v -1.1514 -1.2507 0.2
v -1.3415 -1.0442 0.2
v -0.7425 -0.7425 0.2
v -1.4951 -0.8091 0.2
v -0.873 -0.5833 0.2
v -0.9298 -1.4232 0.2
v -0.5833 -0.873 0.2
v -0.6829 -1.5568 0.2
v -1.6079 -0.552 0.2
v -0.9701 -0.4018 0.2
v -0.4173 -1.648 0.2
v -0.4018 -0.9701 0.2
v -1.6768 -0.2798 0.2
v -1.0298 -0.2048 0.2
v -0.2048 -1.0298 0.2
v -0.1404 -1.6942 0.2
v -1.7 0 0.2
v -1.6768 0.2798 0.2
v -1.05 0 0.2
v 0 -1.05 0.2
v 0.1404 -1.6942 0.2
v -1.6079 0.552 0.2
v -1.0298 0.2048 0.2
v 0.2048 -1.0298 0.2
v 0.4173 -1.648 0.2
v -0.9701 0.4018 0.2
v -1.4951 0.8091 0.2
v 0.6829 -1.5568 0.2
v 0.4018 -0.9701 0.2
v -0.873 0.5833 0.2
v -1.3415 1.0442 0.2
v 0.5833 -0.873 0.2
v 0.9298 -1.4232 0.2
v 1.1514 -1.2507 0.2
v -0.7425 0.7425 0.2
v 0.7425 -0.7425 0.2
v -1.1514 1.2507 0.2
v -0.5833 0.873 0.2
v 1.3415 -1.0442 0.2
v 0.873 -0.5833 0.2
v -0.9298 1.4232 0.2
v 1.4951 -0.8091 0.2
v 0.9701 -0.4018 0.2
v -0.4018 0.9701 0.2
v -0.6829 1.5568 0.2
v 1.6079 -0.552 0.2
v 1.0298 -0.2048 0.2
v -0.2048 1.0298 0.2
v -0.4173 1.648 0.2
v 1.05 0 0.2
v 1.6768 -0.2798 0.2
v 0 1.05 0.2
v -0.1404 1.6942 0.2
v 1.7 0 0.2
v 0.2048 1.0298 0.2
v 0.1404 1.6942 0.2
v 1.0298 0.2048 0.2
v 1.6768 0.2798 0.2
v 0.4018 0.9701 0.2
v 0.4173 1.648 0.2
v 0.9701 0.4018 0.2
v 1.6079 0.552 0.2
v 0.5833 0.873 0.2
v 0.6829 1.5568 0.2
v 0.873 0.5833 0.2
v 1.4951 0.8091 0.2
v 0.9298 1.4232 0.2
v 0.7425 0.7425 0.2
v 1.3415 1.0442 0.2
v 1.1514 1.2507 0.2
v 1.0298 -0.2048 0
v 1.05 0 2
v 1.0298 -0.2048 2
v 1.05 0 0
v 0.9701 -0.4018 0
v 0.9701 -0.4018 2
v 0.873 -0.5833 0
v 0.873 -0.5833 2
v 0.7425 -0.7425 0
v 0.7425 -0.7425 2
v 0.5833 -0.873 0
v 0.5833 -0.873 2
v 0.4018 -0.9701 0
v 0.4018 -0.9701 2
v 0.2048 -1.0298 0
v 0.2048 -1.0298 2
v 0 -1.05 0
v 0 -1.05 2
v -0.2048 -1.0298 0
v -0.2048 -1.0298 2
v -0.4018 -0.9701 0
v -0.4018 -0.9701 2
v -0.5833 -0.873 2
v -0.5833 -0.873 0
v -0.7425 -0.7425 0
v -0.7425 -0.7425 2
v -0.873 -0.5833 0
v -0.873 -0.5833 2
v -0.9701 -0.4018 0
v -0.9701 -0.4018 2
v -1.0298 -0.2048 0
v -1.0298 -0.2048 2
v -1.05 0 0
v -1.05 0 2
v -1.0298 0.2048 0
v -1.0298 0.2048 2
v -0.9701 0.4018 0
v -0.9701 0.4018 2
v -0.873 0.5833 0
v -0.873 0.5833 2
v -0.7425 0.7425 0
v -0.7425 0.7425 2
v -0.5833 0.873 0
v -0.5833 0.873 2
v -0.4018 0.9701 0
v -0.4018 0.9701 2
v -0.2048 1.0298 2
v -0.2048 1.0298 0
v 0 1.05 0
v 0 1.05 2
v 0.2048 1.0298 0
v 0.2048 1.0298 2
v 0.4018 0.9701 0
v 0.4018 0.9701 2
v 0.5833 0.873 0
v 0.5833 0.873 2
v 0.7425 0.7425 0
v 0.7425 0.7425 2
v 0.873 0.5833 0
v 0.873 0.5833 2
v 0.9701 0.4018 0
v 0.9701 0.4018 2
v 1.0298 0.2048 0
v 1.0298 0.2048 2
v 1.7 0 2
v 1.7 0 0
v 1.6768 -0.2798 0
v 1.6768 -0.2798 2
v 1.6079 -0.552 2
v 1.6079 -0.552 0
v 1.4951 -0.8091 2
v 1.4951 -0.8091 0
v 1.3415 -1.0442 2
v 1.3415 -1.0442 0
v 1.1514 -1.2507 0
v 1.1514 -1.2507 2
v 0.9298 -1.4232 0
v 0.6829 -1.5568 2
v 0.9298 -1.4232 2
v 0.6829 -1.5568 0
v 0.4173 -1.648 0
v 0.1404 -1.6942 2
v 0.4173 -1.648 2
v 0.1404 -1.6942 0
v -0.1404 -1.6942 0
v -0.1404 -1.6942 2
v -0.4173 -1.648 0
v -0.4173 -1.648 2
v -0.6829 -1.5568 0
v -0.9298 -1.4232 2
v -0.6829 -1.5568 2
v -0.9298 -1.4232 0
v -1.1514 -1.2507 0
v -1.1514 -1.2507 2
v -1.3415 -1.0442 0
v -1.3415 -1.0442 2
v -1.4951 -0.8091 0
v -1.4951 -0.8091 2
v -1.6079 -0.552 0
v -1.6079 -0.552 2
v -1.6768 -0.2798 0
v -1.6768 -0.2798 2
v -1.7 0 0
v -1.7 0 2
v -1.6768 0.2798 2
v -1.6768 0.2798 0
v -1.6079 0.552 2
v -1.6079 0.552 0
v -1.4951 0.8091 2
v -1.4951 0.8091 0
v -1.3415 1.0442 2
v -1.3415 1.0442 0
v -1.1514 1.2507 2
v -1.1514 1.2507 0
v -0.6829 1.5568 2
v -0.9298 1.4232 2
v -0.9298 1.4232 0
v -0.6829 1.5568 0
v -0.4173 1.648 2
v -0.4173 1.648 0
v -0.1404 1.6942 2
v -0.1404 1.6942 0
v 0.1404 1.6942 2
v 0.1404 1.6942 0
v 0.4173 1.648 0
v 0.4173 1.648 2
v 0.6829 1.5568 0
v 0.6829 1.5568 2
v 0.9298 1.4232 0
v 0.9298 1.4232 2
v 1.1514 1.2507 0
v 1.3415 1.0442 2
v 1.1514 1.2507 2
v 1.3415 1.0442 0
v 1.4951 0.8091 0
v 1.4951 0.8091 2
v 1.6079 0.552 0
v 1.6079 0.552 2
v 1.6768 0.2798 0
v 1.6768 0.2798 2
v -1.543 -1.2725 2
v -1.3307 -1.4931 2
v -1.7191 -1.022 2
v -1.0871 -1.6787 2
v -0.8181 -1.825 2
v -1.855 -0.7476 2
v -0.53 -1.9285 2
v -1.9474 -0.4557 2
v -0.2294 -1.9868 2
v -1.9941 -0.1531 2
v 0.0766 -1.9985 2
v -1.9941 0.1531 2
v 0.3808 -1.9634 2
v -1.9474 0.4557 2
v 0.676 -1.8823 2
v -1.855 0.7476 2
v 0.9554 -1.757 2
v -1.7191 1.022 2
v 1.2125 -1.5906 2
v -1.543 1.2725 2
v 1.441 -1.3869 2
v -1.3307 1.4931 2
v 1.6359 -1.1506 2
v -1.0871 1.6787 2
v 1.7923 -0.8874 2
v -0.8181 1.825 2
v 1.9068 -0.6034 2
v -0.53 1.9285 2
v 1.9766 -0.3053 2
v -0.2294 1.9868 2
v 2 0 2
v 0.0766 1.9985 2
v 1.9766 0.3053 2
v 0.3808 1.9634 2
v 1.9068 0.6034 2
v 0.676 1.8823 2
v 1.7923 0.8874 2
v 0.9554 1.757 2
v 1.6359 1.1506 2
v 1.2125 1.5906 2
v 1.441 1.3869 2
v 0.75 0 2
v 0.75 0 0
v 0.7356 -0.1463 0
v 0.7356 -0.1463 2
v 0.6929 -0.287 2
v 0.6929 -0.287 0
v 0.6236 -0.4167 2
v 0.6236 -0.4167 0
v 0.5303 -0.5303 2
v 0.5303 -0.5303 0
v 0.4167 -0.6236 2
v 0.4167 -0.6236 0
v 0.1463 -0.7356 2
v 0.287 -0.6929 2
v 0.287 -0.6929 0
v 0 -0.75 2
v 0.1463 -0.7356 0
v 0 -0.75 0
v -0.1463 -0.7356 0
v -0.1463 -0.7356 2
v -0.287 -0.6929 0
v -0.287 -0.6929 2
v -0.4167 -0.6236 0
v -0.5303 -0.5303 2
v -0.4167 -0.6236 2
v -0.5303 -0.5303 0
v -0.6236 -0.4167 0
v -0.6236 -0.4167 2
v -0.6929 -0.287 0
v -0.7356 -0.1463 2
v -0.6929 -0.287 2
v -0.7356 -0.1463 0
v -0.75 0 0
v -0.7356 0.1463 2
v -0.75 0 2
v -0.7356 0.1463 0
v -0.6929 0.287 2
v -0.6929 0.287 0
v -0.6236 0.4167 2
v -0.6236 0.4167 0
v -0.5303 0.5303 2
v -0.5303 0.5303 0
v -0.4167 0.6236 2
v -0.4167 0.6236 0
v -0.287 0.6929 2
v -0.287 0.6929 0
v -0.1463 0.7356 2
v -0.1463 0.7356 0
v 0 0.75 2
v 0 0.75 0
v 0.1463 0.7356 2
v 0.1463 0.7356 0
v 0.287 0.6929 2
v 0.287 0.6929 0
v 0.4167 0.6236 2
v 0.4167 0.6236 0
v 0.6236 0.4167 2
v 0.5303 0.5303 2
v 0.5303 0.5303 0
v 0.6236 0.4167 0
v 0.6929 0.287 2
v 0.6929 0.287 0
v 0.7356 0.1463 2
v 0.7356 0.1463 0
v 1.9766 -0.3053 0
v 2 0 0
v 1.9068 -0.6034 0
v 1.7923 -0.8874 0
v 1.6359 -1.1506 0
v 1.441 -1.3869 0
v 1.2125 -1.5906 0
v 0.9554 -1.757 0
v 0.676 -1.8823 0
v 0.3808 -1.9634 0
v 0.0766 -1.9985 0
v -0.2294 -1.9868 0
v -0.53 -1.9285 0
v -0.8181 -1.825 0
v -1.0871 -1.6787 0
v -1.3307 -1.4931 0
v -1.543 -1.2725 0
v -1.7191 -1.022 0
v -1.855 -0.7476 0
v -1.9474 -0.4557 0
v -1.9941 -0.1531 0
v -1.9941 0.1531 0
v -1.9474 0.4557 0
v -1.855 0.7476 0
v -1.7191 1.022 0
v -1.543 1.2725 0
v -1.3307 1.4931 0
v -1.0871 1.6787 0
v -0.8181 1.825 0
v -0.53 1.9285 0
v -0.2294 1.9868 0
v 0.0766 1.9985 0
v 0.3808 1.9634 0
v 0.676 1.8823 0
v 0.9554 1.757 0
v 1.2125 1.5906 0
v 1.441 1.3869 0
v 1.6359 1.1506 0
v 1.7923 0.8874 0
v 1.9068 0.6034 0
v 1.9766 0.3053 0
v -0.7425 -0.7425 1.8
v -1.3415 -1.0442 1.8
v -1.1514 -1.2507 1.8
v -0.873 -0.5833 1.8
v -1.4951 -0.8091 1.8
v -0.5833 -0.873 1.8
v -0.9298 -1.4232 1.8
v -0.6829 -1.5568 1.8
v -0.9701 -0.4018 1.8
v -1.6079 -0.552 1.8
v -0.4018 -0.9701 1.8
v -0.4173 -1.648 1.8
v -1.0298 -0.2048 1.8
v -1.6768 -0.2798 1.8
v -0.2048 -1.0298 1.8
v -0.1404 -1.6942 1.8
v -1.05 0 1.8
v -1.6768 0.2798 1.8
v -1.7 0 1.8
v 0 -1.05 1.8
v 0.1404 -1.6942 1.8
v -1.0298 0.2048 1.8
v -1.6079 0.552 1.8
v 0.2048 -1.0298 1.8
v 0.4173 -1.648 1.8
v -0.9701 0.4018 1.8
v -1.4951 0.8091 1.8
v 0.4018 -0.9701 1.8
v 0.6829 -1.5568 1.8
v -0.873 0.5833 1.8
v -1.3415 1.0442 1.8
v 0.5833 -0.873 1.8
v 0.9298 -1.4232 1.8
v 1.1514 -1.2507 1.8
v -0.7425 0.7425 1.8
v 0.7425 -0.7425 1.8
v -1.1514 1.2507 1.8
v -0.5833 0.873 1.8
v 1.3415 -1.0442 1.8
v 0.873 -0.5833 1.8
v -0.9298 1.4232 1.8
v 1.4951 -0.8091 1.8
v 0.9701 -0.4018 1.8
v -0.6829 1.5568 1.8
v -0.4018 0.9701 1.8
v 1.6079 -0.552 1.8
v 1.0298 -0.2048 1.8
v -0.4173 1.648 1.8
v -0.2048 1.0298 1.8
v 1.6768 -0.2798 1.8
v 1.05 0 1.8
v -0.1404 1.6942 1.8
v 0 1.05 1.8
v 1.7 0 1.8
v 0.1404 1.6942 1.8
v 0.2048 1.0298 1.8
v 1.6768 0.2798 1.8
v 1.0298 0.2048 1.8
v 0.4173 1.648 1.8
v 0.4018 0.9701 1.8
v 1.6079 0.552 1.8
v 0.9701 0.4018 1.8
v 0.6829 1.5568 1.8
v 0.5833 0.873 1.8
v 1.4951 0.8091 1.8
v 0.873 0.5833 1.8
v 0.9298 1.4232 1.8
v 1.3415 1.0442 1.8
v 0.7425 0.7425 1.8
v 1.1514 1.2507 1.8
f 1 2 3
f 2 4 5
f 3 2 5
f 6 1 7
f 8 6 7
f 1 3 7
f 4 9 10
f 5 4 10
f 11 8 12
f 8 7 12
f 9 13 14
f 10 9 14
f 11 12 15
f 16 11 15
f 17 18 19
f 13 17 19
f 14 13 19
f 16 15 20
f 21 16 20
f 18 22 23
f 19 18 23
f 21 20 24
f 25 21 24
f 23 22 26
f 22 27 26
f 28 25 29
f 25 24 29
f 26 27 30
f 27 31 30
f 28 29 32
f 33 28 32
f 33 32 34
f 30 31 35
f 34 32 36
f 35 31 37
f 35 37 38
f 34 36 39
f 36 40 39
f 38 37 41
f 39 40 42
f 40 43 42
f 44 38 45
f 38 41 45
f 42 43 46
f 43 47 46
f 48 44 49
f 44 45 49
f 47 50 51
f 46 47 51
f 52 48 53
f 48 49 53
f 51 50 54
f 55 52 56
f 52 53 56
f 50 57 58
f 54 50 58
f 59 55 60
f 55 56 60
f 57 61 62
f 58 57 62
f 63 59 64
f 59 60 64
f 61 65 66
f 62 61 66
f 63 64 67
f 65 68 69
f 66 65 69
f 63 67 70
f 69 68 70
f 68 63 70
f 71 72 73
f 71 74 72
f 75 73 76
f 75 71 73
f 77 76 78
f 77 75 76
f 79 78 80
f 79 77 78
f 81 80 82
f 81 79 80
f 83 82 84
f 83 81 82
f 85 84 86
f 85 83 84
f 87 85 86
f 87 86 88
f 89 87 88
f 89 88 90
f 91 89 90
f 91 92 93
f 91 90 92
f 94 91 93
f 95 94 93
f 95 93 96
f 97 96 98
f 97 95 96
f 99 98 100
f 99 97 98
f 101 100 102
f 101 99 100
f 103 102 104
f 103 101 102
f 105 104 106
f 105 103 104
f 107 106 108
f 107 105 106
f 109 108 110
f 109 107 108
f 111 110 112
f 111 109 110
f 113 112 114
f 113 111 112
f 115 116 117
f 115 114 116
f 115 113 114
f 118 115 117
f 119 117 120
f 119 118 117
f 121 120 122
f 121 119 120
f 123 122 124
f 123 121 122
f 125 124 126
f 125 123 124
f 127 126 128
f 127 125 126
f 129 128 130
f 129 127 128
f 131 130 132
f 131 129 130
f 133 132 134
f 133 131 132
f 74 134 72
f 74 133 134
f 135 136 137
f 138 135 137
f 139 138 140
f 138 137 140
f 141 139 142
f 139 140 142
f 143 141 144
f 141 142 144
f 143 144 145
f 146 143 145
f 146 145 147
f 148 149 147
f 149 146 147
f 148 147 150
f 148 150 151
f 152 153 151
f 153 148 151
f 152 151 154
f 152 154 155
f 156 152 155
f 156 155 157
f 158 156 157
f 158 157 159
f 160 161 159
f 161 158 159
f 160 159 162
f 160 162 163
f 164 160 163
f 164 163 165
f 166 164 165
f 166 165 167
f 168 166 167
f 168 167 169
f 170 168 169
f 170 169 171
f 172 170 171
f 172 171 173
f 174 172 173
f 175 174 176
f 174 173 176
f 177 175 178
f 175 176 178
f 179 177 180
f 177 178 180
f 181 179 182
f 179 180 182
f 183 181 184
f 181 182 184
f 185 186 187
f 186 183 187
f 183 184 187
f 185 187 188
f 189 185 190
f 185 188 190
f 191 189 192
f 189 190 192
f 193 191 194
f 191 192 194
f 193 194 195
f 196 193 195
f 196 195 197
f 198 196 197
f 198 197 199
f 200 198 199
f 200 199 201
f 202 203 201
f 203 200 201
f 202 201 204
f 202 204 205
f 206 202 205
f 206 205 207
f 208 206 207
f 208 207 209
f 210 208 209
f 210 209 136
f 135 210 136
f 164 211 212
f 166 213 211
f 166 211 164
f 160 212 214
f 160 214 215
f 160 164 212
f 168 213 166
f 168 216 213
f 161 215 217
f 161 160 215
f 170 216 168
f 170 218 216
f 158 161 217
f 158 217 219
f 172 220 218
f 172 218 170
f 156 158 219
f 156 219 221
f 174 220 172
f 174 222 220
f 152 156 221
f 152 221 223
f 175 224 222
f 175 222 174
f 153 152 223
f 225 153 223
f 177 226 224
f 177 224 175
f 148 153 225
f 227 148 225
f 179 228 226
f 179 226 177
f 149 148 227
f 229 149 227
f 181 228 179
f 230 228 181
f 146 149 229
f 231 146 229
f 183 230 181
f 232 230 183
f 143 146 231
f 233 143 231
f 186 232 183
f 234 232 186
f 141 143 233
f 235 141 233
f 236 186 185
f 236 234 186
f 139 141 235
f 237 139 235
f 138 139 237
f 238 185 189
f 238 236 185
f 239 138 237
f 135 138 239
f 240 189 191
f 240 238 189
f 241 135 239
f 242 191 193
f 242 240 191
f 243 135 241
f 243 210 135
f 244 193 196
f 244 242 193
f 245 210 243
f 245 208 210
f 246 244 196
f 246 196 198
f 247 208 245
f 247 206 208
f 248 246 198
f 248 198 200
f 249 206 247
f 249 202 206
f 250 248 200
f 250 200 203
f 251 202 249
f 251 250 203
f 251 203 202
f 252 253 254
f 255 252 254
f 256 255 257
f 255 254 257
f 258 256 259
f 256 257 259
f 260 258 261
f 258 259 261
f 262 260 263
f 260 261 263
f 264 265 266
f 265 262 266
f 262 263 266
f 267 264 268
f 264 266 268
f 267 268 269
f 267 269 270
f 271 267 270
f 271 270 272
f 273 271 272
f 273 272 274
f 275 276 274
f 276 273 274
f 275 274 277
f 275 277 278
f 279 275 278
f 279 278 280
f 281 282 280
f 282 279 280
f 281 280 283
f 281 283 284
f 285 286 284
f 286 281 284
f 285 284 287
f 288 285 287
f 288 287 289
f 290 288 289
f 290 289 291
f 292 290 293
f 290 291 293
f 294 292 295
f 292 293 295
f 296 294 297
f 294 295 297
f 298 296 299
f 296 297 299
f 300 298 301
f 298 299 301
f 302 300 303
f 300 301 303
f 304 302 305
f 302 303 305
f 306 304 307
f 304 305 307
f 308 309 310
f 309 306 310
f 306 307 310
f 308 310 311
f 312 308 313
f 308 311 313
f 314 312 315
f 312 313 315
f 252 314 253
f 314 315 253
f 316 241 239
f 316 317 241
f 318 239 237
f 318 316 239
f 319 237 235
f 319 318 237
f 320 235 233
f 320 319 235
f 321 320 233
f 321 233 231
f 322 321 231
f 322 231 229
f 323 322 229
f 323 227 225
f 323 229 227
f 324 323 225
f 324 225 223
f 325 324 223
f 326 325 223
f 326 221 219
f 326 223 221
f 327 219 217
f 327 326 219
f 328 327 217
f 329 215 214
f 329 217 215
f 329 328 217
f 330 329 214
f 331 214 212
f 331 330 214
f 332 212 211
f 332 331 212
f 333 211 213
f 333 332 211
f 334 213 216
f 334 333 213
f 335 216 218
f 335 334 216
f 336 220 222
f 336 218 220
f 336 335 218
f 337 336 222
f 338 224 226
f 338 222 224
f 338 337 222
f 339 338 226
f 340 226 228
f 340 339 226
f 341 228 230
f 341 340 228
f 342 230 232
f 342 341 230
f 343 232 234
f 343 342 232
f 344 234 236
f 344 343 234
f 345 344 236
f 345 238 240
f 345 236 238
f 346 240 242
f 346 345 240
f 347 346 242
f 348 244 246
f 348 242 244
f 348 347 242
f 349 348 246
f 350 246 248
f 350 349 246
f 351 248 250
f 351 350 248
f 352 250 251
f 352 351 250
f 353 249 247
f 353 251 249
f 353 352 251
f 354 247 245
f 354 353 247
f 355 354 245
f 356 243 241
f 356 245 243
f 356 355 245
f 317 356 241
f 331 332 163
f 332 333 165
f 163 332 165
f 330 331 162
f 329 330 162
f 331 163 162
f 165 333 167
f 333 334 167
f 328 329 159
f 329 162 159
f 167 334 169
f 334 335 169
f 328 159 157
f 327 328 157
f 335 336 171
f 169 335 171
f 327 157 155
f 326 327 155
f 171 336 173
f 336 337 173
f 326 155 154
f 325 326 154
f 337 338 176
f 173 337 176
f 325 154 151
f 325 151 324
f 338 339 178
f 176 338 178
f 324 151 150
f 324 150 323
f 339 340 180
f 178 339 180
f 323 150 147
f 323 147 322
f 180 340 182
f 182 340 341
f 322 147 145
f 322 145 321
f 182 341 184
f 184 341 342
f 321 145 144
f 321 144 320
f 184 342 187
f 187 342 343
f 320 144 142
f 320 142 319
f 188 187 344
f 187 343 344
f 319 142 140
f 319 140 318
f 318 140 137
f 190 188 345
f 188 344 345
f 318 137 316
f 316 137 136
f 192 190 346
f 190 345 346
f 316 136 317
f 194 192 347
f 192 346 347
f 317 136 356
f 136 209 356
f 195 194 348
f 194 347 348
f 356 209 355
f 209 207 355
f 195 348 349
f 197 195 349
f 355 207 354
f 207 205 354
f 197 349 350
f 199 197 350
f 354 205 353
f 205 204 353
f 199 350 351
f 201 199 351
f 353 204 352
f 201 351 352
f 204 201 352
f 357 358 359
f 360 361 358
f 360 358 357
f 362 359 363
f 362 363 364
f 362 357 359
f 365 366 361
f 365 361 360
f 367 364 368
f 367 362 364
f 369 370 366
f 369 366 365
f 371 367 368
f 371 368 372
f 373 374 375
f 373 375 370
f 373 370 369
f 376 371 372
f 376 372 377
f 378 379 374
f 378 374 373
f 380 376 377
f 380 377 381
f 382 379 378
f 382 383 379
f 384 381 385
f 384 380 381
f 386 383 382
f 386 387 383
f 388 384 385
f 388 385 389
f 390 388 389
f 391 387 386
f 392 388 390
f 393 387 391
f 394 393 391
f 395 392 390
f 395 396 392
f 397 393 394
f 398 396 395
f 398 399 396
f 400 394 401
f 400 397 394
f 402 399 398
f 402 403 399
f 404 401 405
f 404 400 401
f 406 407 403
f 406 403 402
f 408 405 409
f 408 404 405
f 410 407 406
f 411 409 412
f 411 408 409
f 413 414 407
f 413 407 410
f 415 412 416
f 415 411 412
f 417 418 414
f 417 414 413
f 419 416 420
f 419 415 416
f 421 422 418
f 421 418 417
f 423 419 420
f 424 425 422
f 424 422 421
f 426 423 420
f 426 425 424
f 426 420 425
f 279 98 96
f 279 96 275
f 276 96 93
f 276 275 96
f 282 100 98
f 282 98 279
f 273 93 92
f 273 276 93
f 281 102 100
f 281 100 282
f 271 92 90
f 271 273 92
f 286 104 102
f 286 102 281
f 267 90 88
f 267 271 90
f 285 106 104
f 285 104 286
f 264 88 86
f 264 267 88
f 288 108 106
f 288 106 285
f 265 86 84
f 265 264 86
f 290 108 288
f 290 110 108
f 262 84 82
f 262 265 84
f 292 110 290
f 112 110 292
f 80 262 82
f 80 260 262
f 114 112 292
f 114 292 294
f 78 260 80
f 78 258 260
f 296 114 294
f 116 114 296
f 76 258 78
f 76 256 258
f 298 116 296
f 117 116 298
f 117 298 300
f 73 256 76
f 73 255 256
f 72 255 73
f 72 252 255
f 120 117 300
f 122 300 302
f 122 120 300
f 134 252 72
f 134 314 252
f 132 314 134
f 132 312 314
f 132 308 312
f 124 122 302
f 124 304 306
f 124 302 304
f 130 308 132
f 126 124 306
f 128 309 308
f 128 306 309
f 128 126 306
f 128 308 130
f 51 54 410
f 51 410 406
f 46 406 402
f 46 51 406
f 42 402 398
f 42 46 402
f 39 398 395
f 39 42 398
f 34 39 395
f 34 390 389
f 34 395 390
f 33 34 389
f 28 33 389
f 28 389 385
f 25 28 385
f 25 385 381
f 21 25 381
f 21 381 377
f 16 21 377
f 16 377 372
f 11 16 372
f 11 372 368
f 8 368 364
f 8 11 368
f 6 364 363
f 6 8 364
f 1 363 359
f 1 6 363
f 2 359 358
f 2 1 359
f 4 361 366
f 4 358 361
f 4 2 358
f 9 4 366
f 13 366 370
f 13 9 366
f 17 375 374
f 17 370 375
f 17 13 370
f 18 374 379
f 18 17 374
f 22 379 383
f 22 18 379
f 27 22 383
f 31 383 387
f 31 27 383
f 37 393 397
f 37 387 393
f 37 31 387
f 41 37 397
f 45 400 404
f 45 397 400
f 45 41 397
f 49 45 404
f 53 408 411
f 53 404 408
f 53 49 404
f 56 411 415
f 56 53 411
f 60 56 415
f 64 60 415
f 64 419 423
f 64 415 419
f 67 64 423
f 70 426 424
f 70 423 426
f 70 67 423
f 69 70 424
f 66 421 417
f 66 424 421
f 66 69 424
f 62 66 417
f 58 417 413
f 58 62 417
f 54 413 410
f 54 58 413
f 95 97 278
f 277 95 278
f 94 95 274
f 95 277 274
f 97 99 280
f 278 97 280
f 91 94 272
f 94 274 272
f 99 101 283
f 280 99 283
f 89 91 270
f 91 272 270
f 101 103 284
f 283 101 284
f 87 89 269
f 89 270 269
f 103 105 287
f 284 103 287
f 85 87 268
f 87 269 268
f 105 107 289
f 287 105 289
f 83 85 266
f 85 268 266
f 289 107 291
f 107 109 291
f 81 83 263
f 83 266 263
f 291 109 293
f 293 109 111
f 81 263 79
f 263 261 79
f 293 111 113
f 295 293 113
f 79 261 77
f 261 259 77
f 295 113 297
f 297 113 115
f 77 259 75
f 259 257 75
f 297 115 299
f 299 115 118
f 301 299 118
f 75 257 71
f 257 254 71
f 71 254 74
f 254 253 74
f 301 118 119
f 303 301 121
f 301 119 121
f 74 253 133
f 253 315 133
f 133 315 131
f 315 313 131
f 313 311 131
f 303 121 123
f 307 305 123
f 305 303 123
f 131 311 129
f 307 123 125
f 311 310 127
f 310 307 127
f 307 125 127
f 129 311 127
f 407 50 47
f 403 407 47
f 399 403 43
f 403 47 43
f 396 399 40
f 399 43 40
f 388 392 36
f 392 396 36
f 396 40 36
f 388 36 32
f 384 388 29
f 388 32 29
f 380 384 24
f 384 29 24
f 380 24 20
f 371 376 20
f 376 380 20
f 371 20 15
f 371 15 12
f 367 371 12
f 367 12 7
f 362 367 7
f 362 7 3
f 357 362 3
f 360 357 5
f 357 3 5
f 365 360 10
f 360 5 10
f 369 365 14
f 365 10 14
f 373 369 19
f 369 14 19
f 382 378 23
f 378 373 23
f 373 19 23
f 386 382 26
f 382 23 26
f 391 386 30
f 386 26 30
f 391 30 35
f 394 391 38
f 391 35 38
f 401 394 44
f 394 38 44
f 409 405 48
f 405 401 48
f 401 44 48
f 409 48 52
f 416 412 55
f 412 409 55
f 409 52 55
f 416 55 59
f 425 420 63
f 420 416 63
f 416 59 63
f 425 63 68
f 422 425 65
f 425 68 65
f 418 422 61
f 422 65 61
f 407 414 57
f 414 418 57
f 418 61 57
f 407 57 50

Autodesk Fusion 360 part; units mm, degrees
sketch "スケッチ1" plane through (0, 0, 0) normal (0, 0, 1) x (1, 0, 0)
  circle A0 centre (0, 0) radius 2
  circle A1 centre (0, 0) radius 1.7
  circle A2 centre (0, 0) radius 1.05
  circle A3 centre (0, 0) radius 0.75
  dimension "d1" = 4
  dimension "d2" = 1.5
  dimension "d3" = 2.1
  dimension "d4" = 3.4
extrude "押し出し1" add sketch "スケッチ1" along normal blind 2 contours A0 makes body 1
extrude "押し出し2" add sketch "スケッチ1" along normal blind 1.6 from surface at 0.2 separate body contours A1 makes body 2
extrude "押し出し1'" add sketch "スケッチ1" along normal blind 2 separate body contours A2 makes body 3 in component "Component"
component "Component" placed x (1, 0, 0) y (0, 1, 0) z (0, 0, 1) at (0, 0, 0)
